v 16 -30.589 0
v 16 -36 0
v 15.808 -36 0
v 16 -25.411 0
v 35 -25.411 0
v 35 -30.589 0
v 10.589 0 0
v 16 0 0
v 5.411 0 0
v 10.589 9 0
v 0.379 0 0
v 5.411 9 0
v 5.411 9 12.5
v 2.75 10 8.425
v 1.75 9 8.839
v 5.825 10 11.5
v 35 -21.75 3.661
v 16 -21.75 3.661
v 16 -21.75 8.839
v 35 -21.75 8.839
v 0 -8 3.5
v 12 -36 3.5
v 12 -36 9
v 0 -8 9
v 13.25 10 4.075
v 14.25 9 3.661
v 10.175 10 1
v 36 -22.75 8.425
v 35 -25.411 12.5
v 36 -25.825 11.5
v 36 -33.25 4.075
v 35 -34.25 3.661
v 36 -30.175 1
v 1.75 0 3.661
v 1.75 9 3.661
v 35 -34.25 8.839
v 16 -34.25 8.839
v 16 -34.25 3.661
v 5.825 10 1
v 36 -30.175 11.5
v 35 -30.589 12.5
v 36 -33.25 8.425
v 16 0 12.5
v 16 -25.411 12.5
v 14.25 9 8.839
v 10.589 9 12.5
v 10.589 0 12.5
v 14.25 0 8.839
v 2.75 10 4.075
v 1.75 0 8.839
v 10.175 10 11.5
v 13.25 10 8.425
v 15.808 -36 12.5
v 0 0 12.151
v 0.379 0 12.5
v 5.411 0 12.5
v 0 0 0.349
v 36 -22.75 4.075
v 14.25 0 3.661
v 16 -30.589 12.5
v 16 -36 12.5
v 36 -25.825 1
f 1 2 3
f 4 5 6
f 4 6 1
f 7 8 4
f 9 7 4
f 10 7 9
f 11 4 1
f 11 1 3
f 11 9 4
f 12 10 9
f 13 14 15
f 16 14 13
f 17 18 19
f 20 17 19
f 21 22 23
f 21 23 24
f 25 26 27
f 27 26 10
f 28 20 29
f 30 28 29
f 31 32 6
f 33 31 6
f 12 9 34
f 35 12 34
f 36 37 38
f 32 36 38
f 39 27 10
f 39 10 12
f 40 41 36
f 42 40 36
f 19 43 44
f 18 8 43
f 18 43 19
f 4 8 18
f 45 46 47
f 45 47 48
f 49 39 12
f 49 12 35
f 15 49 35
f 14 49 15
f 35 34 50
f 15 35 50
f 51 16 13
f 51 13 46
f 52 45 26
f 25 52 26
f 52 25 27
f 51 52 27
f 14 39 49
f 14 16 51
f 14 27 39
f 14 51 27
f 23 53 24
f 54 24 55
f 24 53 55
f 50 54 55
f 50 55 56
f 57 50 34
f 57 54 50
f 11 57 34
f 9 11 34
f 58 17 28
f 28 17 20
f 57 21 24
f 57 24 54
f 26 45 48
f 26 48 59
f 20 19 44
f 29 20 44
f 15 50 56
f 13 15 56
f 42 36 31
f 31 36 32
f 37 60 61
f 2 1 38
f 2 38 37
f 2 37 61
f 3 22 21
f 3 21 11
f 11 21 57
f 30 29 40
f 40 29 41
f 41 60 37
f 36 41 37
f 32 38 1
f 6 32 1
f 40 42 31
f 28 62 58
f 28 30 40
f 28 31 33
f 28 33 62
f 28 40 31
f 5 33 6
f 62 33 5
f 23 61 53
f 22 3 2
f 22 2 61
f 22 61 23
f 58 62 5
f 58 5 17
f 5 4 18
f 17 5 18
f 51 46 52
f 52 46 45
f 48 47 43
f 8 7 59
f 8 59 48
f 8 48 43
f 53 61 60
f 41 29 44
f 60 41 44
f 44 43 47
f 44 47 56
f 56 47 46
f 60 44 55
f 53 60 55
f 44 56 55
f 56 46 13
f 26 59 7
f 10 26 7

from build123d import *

# Parameters (mm, degrees)
PAD_DEPTH       = 12.5
PAD001_DEPTH    = 10
PAD002_DEPTH    = 20
CHAMFER_SIZE    = 1
CHAMFER001_SIZE = 1
CHAMFER002_SIZE = 3.5


with BuildPart() as part:
    # Sketch → Pad (new body)
    with BuildSketch(Plane.XY):
        Polygon((0, 0), (16, 0), (16, -36), (12, -36), (0, -8), align=None)
    extrude(amount=PAD_DEPTH)

    # Sketch001 (on Face1 of Pad) → Pad001 (join)
    with BuildSketch(Plane(origin=(0, 0, 0), x_dir=(-1, 0, 0), z_dir=(0, 1, 0))):
        Polygon((-5.411165, 0), (-1.75, 3.661165), (-1.75, 8.838835), (-5.411165, 12.5), (-10.588835, 12.5), (-14.25, 8.838835), (-14.25, 3.661165), (-10.588835, 0), align=None)
    extrude(amount=PAD001_DEPTH)

    # Sketch002 (on Face12 of Pad001) → Pad002 (join)
    with BuildSketch(Plane.YZ.offset(16)):
        Polygon((-25.411165, 0), (-21.75, 3.661165), (-21.75, 8.838835), (-25.411165, 12.5), (-30.588835, 12.5), (-34.25, 8.838835), (-34.25, 3.661165), (-30.588835, 0), align=None)
    extrude(amount=PAD002_DEPTH)

    # Chamfer
    chamfer_edges = [part.edges().sort_by_distance(p)[0] for p in [
        (3.580583, 10, 1.830583),
        (1.75, 10, 6.25),
        (3.580583, 10, 10.669417),
        (8, 10, 12.5),
        (12.419417, 10, 10.669417),
        (14.25, 10, 6.25),
        (12.419417, 10, 1.830583),
        (8, 10, 0),
    ]]
    chamfer(chamfer_edges, length=CHAMFER_SIZE)

    # Chamfer001
    chamfer001_edges = [part.edges().sort_by_distance(p)[0] for p in [
        (36, -23.580583, 1.830583),
        (36, -21.75, 6.25),
        (36, -23.580583, 10.669417),
        (36, -28, 12.5),
        (36, -32.419417, 10.669417),
        (36, -34.25, 6.25),
        (36, -32.419417, 1.830583),
        (36, -28, 0),
    ]]
    chamfer(chamfer001_edges, length=CHAMFER001_SIZE)

    # Chamfer002
    chamfer002_edges = [part.edges().sort_by_distance(p)[0] for p in [
        (6, -22, 0),
        (6, -22, 12.5),
    ]]
    chamfer(chamfer002_edges, length=CHAMFER002_SIZE)


solid = part.part
